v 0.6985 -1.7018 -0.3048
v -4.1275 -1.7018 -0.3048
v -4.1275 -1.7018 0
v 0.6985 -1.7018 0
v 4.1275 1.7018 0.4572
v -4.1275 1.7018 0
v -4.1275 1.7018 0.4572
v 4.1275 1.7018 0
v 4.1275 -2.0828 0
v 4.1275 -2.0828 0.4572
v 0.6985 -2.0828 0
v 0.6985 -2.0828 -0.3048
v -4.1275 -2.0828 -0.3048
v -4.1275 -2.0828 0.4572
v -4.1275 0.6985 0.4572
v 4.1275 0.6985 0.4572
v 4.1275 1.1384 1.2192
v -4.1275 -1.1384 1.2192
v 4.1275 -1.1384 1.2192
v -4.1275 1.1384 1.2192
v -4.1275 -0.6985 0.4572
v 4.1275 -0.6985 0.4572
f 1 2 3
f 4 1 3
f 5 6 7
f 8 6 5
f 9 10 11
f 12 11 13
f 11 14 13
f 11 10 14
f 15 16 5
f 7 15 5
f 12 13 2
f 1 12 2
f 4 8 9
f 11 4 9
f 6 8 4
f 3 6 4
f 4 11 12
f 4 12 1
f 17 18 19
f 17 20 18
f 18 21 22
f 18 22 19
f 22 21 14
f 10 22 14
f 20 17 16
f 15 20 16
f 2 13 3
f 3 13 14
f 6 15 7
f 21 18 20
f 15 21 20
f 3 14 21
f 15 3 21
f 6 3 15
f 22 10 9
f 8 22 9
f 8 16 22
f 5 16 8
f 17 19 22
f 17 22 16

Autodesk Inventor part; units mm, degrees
ref_plane "YZ Plane" through (0, 0, 0) normal (1, 0, 0) x (0, 1, 0)
ref_plane "XZ Plane" through (0, 0, 0) normal (0, 1, 0) x (-1, 0, 0)
ref_plane "XY Plane" through (0, 0, 0) normal (0, 0, 1) x (1, 0, 0)
sketch "Sketch1" plane through (0, 0, 0) normal (0, 0, 1) x (1, 0, 0)
  line L0 (0, 2.3825) -> (0, -2.3825) projected
  line L1 (-5.7785, 0) -> (5.7785, 0) projected
  line L2 (4.1275, -1.7018) -> (-4.1275, -1.7018)
  line L3 (-4.1275, -1.7018) -> (-4.1275, 1.7018)
  line L4 (-4.1275, 1.7018) -> (4.1275, 1.7018)
  line L5 (4.1275, 1.7018) -> (4.1275, -1.7018)
  line L6 (4.1275, -1.7018) -> (-4.1275, 1.7018) construction
  line L7 (-4.1275, -1.7018) -> (4.1275, 1.7018) construction
  point P0 (0, 0)
  dimension "d0" = 8.255
  dimension "d1" = 3.4036
extrude "Extrusion1" add sketch "Sketch1" along normal blind 1.2192
sketch "Sketch2" plane through (4.1275, -1.7018, 0) normal (1, 0, 0) x (0, 0, -1)
  line L0 (0, 0) -> (-1.2192, 0) projected
  line L1 (-1.2192, 0) -> (-1.2192, 3.4036) projected
  line L2 (0, 3.4036) -> (0, 0) projected
  line L3 (-0.4572, 0) -> (-0.4572, 1.0033)
  line L4 (-0.4572, 1.0033) -> (-1.2192, 0.5634)
  line L5 (-1.2192, 0.5634) -> (-1.2192, 0)
  line L6 (-1.2192, 0) -> (-0.4572, 0)
  line L7 (-1.463, 1.7018) -> (0.2438, 1.7018) projected
  point P0 (0, 1.7018)
  dimension "d6" = 60
  dimension "d15" = 0.5634
  dimension "d28" = 0.6985
  dimension "d32" = 1.1384
  dimension "d33" = 0.4572
extrude "Extrusion2" cut sketch "Sketch2" against normal blind 8.255 contours L0 L1 L4 L3
mirror "Mirror1" about plane through (0, 0, 0) normal (0, 1, 0) of "Extrusion2"
sketch "Sketch5" plane through (-4.1275, 0, 0) normal (1, 0, 0) x (0, 1, 0)
  line L0 (1.7018, 0) -> (-1.7018, 0) projected
  line L1 (-1.7018, 0) -> (-1.7018, 0.4572) projected
  line L2 (1.7018, 0) -> (1.7018, 0.4572) projected
  line L3 (-1.7018, 0) -> (-2.0828, 0)
  line L4 (-2.0828, 0) -> (-2.0828, -0.3048)
  line L5 (-2.0828, -0.3048) -> (-1.7018, -0.3048)
  line L6 (-1.7018, -0.3048) -> (-1.7018, 0)
  line L7 (1.7018, 0) -> (2.0828, 0)
  line L8 (2.0828, 0) -> (2.0828, -0.3048)
  line L9 (2.0828, -0.3048) -> (1.7018, -0.3048)
  line L10 (1.7018, -0.3048) -> (1.7018, 0)
  line L11 (0, 1.524) -> (0, -0.6096) projected
  line L12 (-1.7018, 0.4572) -> (-2.0828, 0.4572)
  line L13 (-2.0828, 0.4572) -> (-2.0828, 0)
  point P0 (0, 0)
  dimension "d20" = 0.3048
  dimension "d29" = 0.381
extrude "Extrusion5" add sketch "Sketch5" along normal up to surface (8.255 mm away) contours L3 L13 L12 L1
extrude "Extrusion7" add sketch "Sketch5" along normal blind 4.826 contours L6 L5 L4 L3
properties part number "J008039 NEUROPIXELS DOVE TAIL MOUNT GEN 2 Rev -" material "ALUMINUM, 6061-T651"
